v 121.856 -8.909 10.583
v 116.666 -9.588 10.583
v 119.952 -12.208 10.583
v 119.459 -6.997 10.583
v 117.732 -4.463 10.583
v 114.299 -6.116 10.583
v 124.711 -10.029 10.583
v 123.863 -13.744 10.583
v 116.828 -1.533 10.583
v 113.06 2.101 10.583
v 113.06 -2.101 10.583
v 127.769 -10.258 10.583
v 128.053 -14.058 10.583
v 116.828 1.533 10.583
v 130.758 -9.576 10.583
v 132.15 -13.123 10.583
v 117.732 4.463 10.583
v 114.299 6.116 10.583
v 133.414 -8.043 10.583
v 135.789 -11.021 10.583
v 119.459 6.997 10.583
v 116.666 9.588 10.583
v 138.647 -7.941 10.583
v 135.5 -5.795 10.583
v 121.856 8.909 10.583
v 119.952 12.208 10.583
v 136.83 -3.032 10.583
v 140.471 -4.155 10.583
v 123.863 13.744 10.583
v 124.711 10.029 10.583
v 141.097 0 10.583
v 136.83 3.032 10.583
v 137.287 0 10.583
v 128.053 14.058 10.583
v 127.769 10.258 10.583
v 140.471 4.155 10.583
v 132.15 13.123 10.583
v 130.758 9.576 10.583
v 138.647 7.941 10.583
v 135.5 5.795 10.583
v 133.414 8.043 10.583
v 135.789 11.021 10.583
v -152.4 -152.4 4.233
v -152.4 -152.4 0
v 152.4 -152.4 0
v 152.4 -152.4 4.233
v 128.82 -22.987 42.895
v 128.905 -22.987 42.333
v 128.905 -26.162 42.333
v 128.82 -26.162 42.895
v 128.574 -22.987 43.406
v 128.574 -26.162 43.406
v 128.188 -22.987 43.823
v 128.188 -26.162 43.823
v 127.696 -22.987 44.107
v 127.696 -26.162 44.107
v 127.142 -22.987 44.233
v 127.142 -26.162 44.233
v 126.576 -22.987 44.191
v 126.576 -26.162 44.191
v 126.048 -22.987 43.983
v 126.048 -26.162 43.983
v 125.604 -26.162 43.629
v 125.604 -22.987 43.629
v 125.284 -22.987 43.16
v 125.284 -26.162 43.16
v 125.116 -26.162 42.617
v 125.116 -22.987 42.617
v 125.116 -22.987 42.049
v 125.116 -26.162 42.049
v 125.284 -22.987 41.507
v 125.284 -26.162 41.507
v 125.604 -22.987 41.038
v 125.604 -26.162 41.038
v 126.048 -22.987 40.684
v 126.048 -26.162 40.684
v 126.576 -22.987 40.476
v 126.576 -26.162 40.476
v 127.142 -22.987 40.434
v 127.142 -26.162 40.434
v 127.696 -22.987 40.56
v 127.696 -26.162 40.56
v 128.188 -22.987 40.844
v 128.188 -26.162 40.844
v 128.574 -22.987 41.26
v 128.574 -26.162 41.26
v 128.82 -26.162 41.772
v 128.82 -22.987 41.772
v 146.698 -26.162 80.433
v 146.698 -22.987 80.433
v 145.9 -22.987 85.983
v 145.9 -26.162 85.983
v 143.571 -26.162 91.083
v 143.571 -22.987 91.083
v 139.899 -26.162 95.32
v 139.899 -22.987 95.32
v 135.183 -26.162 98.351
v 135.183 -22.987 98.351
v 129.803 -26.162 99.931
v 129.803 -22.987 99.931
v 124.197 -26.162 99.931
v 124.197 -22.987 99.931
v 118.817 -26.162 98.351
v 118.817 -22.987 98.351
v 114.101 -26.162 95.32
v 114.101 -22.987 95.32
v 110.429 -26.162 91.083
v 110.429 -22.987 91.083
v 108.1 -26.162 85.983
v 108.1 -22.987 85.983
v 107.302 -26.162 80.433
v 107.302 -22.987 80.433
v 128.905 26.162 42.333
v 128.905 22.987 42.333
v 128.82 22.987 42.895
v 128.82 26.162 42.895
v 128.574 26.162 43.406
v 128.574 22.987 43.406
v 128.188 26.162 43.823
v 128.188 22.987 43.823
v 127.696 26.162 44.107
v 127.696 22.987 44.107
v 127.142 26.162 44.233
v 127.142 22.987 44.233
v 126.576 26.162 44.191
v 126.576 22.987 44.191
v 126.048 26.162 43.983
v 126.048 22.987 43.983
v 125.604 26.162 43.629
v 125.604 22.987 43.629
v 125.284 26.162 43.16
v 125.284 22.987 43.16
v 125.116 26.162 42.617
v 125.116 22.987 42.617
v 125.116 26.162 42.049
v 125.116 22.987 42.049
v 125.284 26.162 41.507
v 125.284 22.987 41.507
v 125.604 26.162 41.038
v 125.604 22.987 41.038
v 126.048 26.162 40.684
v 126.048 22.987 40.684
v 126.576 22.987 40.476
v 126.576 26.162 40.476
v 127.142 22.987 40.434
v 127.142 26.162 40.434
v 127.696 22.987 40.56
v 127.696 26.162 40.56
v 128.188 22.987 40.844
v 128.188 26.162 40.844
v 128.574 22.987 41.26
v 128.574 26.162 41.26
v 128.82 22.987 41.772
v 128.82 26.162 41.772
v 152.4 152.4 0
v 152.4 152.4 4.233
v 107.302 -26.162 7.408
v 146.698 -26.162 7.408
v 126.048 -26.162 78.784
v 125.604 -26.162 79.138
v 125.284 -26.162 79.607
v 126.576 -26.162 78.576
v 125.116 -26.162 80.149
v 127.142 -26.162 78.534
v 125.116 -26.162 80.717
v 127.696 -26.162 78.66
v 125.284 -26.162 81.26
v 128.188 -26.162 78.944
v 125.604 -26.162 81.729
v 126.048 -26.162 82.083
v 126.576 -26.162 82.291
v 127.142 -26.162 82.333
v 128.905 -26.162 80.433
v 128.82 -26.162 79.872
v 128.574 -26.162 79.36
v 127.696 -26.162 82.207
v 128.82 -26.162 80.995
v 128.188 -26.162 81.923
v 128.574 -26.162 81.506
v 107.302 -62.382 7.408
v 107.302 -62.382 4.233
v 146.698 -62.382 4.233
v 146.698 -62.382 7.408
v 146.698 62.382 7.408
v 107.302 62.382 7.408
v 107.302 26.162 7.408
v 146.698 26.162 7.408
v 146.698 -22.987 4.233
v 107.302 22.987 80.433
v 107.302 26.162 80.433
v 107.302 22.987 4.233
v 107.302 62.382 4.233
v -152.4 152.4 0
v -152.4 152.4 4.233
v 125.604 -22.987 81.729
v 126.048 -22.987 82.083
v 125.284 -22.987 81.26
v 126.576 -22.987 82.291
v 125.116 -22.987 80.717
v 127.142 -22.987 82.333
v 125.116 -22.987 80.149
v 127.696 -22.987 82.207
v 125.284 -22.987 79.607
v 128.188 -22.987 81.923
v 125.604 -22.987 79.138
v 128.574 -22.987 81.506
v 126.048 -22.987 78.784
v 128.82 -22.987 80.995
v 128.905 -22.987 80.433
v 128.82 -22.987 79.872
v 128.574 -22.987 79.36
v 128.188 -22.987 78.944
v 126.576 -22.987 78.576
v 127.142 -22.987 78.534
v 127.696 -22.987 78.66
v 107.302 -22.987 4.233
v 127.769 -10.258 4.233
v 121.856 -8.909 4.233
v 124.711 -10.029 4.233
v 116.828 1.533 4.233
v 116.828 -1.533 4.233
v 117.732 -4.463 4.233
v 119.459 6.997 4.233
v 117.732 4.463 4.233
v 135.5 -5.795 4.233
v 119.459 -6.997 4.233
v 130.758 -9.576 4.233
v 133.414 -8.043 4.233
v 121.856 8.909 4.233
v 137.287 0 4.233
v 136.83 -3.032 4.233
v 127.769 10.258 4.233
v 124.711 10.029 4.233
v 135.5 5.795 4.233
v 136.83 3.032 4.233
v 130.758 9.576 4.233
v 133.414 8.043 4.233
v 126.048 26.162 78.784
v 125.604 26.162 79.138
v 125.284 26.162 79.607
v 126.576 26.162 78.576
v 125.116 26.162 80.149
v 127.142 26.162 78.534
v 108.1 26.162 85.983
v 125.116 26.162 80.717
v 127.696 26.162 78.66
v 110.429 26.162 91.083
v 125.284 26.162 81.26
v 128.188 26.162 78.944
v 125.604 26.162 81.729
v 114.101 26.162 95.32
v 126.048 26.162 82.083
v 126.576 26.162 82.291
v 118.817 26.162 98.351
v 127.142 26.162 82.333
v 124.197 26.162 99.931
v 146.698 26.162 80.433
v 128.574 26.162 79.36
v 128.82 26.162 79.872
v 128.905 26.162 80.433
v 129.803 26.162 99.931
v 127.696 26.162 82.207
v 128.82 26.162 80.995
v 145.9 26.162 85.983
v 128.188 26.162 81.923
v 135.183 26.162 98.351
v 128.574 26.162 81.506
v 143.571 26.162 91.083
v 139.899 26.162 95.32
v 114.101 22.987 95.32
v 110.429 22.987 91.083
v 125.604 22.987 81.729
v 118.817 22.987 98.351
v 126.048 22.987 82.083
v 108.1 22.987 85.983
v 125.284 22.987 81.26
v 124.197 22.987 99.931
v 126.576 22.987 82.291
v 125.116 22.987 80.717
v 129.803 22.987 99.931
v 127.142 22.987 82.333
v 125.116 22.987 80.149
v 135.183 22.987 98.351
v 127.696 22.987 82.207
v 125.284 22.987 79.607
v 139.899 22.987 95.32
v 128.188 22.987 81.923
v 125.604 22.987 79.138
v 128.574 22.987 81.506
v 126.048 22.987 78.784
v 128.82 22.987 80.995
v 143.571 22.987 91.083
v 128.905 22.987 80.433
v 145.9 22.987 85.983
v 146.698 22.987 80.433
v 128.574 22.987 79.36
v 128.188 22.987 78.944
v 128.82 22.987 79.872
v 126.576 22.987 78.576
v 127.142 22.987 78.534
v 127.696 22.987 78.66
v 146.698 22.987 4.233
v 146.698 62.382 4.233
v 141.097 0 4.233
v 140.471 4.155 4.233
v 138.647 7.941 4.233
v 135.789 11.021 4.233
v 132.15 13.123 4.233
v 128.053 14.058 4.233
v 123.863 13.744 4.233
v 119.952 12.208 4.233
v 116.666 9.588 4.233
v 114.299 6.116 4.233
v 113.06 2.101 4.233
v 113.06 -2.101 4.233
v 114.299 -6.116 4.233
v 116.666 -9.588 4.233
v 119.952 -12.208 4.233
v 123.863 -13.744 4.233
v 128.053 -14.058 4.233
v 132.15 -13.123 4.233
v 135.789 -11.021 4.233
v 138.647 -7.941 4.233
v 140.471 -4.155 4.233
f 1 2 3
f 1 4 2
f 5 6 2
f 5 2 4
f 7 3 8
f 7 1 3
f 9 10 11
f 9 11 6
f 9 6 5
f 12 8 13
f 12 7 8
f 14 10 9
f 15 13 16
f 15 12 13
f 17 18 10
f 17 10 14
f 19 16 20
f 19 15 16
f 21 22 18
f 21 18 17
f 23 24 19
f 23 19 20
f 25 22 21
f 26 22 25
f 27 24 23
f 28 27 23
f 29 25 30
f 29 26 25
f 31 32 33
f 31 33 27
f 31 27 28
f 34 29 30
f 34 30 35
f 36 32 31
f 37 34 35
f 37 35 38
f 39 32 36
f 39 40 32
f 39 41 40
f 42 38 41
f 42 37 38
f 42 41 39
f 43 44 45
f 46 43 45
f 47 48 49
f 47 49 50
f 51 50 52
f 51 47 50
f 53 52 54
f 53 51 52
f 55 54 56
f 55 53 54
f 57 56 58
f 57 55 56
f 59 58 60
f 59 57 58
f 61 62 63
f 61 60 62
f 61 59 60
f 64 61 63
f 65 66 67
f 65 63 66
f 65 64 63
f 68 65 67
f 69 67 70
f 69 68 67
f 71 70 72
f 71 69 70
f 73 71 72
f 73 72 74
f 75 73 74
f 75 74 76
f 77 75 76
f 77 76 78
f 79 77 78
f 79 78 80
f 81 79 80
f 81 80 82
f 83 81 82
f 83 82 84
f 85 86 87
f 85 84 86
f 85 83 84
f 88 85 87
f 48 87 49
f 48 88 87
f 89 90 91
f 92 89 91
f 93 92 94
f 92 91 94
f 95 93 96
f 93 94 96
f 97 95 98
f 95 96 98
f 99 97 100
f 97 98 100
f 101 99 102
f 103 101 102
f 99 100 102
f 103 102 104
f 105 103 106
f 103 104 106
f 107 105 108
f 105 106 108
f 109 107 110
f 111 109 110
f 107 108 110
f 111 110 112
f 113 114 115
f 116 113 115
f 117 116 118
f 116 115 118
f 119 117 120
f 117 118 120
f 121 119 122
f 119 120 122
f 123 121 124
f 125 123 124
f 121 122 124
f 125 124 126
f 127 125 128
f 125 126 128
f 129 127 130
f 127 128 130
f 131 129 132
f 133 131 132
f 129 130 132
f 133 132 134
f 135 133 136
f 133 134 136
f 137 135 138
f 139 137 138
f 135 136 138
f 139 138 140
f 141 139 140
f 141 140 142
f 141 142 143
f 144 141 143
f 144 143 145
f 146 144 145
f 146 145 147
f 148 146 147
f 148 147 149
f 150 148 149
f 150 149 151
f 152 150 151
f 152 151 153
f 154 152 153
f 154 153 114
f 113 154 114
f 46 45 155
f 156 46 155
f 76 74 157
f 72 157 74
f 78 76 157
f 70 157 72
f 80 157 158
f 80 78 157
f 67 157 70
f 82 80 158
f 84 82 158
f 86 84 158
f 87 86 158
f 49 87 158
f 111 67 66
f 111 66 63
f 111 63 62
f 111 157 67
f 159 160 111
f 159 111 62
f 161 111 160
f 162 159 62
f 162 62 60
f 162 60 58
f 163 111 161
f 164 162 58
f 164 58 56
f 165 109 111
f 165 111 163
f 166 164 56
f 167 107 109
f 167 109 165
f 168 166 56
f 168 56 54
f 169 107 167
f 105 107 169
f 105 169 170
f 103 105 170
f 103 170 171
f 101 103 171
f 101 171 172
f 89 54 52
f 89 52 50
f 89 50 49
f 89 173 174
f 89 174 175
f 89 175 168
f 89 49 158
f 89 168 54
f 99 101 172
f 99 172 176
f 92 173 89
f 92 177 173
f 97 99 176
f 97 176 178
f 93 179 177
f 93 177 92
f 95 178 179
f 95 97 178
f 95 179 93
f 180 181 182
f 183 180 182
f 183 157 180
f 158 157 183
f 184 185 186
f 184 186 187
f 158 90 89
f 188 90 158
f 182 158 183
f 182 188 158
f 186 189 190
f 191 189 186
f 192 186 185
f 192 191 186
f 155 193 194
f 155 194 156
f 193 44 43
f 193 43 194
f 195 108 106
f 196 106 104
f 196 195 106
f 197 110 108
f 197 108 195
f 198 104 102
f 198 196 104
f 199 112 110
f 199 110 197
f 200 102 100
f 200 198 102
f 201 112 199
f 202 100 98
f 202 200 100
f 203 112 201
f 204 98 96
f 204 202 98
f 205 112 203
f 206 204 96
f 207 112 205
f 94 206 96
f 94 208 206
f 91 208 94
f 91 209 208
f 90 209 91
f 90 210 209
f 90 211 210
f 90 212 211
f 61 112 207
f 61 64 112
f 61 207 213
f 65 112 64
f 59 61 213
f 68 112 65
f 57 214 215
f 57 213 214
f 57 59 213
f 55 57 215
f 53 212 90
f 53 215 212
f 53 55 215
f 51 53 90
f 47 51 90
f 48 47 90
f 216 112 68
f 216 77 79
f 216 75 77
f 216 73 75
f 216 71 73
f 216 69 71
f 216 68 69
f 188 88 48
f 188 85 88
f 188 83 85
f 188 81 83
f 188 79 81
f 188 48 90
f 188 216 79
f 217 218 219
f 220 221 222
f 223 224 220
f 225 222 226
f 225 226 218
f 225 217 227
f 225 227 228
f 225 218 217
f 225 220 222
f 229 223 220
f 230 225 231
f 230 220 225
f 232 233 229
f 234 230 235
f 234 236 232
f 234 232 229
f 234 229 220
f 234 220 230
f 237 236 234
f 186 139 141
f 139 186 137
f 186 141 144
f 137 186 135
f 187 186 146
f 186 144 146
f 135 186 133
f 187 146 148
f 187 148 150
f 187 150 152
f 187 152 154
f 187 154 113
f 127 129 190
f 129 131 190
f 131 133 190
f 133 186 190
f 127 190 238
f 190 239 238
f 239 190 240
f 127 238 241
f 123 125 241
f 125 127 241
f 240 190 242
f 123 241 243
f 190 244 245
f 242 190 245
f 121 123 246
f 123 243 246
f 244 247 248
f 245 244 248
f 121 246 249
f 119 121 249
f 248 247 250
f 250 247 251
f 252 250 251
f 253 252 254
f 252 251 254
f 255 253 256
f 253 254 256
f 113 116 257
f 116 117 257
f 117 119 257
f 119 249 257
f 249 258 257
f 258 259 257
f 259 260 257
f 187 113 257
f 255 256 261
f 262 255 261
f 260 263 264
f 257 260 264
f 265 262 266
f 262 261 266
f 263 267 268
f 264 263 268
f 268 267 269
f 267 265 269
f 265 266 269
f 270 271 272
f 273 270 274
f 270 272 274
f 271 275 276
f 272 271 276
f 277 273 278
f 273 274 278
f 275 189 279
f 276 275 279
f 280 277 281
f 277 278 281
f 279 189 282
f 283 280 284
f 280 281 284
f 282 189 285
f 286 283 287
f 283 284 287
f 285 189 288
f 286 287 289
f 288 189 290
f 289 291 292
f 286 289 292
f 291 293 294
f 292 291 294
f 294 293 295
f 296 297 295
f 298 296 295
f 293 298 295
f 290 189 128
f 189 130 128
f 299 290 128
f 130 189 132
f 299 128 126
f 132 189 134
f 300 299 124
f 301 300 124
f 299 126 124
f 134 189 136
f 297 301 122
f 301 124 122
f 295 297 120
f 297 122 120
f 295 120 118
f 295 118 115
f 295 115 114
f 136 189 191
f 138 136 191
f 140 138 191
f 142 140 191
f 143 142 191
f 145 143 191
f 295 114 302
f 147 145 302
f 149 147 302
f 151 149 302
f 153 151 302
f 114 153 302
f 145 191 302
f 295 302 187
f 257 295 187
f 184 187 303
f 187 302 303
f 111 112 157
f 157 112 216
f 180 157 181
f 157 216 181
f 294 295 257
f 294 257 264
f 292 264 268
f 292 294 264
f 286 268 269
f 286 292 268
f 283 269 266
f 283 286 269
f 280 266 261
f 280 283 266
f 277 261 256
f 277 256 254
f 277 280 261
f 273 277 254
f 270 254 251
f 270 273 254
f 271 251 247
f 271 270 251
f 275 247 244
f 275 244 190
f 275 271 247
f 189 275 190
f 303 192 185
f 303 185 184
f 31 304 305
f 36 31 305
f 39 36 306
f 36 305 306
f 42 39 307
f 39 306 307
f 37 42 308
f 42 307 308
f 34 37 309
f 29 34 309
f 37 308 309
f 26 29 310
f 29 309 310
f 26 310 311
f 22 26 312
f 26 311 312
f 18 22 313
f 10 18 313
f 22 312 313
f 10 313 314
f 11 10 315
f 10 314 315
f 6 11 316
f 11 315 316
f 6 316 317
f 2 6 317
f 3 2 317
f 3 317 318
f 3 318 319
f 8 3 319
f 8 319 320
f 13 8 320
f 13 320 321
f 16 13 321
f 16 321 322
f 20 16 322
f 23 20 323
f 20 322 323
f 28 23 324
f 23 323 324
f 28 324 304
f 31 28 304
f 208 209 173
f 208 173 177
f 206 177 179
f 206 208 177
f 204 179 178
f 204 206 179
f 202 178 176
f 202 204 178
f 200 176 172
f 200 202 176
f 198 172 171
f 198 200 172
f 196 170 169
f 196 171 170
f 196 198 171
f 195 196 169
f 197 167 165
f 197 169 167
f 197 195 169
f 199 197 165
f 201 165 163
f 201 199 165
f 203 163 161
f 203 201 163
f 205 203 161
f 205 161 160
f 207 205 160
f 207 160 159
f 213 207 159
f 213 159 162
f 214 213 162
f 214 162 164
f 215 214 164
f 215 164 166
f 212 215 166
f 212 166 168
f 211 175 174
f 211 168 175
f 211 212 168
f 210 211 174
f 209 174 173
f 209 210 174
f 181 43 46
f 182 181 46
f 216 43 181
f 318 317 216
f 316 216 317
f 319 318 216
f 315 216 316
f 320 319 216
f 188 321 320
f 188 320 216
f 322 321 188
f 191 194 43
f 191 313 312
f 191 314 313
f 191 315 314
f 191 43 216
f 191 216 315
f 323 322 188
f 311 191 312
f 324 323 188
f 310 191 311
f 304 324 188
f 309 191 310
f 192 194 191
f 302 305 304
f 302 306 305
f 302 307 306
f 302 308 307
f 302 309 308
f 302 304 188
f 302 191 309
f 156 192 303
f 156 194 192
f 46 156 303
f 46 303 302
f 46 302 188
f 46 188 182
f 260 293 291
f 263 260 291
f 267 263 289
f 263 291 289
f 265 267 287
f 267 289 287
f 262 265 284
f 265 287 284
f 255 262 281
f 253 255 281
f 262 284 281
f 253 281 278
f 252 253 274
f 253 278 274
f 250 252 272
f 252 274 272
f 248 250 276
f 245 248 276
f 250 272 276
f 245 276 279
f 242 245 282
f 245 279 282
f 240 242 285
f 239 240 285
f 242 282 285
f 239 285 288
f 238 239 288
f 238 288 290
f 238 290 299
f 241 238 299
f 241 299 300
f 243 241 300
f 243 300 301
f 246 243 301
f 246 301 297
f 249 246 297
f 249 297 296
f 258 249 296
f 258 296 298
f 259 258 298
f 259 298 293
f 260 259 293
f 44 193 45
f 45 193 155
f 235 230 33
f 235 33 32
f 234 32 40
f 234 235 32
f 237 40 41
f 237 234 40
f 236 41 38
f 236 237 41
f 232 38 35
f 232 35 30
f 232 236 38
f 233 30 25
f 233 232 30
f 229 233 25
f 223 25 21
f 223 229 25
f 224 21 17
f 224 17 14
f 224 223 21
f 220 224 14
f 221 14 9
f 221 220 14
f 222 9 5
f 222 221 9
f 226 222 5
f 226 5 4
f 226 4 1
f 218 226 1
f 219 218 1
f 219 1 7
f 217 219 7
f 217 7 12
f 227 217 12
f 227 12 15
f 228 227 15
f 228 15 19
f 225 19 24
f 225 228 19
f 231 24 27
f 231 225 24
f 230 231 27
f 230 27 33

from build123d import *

# Parameters (mm, degrees)
F0_W           = 304.8
F0_H           = 304.8
F1_DEPTH       = 4.2333333333
F2_R           = 14.097
F2_R_2         = 10.287
F3_DEPTH       = 6.35
F4_W           = 39.3954
F4_H           = 39.3954
F5_DEPTH       = 3.175
F6_W           = 39.3954
F6_H           = 76.2
F7_DEPTH       = 3.175
F9_R           = 1.905
F10_DEPTH      = 129.414
F10_DEPTH_BACK = 86.36


with BuildPart() as f1:
    # F0 (on Top) → F1 (new body)
    with BuildSketch(Plane.XY):
        Rectangle(F0_W, F0_H)
    extrude(amount=F1_DEPTH)

    # F2 (on face) → F3 (join)
    with BuildSketch(Plane.XY.offset(4.2333333333)):
        with Locations((127, 0)):
            Circle(F2_R)
        with Locations((127, 0)):
            Circle(F2_R_2, mode=Mode.SUBTRACT)
    extrude(amount=F3_DEPTH)

    # F4 (on face) → F5 (join)
    with BuildSketch(Plane.XY.offset(4.2333333333)):
        with Locations((127, 42.6847)):
            Rectangle(F4_W, F4_H)
        with Locations((127, -42.6847)):
            Rectangle(F4_W, F4_H)
    extrude(amount=F5_DEPTH)

    # F6 (on face) → F7 (join)
    with BuildSketch(Plane.XZ.offset(-22.987)):
        with Locations((127, 42.3333333333)):
            Rectangle(F6_W, F6_H)
        with BuildLine():
            ThreePointArc((146.6977, 80.4333333333), (127, 100.1310333333), (107.3023, 80.4333333333))
            Line((107.3023, 80.4333333333), (146.6977, 80.4333333333))
        make_face()
    extrude(amount=-F7_DEPTH)

    # F8: F1 across plane


with BuildPart() as f1_1:
    add(f1.part)
    add(f1.part.mirror(Plane.XZ))

    # F9 (on face) → F10 (cut, two sides)
    with BuildSketch(Plane.XZ.offset(-22.987)) as f10_sk:
        with Locations((127, 42.3333333333)):
            Circle(F9_R)
        with Locations((127, 80.4333333333)):
            Circle(F9_R)
    extrude(amount=-F10_DEPTH, mode=Mode.SUBTRACT)
    extrude(f10_sk.sketch, amount=F10_DEPTH_BACK, mode=Mode.SUBTRACT)


solid = f1_1.part
